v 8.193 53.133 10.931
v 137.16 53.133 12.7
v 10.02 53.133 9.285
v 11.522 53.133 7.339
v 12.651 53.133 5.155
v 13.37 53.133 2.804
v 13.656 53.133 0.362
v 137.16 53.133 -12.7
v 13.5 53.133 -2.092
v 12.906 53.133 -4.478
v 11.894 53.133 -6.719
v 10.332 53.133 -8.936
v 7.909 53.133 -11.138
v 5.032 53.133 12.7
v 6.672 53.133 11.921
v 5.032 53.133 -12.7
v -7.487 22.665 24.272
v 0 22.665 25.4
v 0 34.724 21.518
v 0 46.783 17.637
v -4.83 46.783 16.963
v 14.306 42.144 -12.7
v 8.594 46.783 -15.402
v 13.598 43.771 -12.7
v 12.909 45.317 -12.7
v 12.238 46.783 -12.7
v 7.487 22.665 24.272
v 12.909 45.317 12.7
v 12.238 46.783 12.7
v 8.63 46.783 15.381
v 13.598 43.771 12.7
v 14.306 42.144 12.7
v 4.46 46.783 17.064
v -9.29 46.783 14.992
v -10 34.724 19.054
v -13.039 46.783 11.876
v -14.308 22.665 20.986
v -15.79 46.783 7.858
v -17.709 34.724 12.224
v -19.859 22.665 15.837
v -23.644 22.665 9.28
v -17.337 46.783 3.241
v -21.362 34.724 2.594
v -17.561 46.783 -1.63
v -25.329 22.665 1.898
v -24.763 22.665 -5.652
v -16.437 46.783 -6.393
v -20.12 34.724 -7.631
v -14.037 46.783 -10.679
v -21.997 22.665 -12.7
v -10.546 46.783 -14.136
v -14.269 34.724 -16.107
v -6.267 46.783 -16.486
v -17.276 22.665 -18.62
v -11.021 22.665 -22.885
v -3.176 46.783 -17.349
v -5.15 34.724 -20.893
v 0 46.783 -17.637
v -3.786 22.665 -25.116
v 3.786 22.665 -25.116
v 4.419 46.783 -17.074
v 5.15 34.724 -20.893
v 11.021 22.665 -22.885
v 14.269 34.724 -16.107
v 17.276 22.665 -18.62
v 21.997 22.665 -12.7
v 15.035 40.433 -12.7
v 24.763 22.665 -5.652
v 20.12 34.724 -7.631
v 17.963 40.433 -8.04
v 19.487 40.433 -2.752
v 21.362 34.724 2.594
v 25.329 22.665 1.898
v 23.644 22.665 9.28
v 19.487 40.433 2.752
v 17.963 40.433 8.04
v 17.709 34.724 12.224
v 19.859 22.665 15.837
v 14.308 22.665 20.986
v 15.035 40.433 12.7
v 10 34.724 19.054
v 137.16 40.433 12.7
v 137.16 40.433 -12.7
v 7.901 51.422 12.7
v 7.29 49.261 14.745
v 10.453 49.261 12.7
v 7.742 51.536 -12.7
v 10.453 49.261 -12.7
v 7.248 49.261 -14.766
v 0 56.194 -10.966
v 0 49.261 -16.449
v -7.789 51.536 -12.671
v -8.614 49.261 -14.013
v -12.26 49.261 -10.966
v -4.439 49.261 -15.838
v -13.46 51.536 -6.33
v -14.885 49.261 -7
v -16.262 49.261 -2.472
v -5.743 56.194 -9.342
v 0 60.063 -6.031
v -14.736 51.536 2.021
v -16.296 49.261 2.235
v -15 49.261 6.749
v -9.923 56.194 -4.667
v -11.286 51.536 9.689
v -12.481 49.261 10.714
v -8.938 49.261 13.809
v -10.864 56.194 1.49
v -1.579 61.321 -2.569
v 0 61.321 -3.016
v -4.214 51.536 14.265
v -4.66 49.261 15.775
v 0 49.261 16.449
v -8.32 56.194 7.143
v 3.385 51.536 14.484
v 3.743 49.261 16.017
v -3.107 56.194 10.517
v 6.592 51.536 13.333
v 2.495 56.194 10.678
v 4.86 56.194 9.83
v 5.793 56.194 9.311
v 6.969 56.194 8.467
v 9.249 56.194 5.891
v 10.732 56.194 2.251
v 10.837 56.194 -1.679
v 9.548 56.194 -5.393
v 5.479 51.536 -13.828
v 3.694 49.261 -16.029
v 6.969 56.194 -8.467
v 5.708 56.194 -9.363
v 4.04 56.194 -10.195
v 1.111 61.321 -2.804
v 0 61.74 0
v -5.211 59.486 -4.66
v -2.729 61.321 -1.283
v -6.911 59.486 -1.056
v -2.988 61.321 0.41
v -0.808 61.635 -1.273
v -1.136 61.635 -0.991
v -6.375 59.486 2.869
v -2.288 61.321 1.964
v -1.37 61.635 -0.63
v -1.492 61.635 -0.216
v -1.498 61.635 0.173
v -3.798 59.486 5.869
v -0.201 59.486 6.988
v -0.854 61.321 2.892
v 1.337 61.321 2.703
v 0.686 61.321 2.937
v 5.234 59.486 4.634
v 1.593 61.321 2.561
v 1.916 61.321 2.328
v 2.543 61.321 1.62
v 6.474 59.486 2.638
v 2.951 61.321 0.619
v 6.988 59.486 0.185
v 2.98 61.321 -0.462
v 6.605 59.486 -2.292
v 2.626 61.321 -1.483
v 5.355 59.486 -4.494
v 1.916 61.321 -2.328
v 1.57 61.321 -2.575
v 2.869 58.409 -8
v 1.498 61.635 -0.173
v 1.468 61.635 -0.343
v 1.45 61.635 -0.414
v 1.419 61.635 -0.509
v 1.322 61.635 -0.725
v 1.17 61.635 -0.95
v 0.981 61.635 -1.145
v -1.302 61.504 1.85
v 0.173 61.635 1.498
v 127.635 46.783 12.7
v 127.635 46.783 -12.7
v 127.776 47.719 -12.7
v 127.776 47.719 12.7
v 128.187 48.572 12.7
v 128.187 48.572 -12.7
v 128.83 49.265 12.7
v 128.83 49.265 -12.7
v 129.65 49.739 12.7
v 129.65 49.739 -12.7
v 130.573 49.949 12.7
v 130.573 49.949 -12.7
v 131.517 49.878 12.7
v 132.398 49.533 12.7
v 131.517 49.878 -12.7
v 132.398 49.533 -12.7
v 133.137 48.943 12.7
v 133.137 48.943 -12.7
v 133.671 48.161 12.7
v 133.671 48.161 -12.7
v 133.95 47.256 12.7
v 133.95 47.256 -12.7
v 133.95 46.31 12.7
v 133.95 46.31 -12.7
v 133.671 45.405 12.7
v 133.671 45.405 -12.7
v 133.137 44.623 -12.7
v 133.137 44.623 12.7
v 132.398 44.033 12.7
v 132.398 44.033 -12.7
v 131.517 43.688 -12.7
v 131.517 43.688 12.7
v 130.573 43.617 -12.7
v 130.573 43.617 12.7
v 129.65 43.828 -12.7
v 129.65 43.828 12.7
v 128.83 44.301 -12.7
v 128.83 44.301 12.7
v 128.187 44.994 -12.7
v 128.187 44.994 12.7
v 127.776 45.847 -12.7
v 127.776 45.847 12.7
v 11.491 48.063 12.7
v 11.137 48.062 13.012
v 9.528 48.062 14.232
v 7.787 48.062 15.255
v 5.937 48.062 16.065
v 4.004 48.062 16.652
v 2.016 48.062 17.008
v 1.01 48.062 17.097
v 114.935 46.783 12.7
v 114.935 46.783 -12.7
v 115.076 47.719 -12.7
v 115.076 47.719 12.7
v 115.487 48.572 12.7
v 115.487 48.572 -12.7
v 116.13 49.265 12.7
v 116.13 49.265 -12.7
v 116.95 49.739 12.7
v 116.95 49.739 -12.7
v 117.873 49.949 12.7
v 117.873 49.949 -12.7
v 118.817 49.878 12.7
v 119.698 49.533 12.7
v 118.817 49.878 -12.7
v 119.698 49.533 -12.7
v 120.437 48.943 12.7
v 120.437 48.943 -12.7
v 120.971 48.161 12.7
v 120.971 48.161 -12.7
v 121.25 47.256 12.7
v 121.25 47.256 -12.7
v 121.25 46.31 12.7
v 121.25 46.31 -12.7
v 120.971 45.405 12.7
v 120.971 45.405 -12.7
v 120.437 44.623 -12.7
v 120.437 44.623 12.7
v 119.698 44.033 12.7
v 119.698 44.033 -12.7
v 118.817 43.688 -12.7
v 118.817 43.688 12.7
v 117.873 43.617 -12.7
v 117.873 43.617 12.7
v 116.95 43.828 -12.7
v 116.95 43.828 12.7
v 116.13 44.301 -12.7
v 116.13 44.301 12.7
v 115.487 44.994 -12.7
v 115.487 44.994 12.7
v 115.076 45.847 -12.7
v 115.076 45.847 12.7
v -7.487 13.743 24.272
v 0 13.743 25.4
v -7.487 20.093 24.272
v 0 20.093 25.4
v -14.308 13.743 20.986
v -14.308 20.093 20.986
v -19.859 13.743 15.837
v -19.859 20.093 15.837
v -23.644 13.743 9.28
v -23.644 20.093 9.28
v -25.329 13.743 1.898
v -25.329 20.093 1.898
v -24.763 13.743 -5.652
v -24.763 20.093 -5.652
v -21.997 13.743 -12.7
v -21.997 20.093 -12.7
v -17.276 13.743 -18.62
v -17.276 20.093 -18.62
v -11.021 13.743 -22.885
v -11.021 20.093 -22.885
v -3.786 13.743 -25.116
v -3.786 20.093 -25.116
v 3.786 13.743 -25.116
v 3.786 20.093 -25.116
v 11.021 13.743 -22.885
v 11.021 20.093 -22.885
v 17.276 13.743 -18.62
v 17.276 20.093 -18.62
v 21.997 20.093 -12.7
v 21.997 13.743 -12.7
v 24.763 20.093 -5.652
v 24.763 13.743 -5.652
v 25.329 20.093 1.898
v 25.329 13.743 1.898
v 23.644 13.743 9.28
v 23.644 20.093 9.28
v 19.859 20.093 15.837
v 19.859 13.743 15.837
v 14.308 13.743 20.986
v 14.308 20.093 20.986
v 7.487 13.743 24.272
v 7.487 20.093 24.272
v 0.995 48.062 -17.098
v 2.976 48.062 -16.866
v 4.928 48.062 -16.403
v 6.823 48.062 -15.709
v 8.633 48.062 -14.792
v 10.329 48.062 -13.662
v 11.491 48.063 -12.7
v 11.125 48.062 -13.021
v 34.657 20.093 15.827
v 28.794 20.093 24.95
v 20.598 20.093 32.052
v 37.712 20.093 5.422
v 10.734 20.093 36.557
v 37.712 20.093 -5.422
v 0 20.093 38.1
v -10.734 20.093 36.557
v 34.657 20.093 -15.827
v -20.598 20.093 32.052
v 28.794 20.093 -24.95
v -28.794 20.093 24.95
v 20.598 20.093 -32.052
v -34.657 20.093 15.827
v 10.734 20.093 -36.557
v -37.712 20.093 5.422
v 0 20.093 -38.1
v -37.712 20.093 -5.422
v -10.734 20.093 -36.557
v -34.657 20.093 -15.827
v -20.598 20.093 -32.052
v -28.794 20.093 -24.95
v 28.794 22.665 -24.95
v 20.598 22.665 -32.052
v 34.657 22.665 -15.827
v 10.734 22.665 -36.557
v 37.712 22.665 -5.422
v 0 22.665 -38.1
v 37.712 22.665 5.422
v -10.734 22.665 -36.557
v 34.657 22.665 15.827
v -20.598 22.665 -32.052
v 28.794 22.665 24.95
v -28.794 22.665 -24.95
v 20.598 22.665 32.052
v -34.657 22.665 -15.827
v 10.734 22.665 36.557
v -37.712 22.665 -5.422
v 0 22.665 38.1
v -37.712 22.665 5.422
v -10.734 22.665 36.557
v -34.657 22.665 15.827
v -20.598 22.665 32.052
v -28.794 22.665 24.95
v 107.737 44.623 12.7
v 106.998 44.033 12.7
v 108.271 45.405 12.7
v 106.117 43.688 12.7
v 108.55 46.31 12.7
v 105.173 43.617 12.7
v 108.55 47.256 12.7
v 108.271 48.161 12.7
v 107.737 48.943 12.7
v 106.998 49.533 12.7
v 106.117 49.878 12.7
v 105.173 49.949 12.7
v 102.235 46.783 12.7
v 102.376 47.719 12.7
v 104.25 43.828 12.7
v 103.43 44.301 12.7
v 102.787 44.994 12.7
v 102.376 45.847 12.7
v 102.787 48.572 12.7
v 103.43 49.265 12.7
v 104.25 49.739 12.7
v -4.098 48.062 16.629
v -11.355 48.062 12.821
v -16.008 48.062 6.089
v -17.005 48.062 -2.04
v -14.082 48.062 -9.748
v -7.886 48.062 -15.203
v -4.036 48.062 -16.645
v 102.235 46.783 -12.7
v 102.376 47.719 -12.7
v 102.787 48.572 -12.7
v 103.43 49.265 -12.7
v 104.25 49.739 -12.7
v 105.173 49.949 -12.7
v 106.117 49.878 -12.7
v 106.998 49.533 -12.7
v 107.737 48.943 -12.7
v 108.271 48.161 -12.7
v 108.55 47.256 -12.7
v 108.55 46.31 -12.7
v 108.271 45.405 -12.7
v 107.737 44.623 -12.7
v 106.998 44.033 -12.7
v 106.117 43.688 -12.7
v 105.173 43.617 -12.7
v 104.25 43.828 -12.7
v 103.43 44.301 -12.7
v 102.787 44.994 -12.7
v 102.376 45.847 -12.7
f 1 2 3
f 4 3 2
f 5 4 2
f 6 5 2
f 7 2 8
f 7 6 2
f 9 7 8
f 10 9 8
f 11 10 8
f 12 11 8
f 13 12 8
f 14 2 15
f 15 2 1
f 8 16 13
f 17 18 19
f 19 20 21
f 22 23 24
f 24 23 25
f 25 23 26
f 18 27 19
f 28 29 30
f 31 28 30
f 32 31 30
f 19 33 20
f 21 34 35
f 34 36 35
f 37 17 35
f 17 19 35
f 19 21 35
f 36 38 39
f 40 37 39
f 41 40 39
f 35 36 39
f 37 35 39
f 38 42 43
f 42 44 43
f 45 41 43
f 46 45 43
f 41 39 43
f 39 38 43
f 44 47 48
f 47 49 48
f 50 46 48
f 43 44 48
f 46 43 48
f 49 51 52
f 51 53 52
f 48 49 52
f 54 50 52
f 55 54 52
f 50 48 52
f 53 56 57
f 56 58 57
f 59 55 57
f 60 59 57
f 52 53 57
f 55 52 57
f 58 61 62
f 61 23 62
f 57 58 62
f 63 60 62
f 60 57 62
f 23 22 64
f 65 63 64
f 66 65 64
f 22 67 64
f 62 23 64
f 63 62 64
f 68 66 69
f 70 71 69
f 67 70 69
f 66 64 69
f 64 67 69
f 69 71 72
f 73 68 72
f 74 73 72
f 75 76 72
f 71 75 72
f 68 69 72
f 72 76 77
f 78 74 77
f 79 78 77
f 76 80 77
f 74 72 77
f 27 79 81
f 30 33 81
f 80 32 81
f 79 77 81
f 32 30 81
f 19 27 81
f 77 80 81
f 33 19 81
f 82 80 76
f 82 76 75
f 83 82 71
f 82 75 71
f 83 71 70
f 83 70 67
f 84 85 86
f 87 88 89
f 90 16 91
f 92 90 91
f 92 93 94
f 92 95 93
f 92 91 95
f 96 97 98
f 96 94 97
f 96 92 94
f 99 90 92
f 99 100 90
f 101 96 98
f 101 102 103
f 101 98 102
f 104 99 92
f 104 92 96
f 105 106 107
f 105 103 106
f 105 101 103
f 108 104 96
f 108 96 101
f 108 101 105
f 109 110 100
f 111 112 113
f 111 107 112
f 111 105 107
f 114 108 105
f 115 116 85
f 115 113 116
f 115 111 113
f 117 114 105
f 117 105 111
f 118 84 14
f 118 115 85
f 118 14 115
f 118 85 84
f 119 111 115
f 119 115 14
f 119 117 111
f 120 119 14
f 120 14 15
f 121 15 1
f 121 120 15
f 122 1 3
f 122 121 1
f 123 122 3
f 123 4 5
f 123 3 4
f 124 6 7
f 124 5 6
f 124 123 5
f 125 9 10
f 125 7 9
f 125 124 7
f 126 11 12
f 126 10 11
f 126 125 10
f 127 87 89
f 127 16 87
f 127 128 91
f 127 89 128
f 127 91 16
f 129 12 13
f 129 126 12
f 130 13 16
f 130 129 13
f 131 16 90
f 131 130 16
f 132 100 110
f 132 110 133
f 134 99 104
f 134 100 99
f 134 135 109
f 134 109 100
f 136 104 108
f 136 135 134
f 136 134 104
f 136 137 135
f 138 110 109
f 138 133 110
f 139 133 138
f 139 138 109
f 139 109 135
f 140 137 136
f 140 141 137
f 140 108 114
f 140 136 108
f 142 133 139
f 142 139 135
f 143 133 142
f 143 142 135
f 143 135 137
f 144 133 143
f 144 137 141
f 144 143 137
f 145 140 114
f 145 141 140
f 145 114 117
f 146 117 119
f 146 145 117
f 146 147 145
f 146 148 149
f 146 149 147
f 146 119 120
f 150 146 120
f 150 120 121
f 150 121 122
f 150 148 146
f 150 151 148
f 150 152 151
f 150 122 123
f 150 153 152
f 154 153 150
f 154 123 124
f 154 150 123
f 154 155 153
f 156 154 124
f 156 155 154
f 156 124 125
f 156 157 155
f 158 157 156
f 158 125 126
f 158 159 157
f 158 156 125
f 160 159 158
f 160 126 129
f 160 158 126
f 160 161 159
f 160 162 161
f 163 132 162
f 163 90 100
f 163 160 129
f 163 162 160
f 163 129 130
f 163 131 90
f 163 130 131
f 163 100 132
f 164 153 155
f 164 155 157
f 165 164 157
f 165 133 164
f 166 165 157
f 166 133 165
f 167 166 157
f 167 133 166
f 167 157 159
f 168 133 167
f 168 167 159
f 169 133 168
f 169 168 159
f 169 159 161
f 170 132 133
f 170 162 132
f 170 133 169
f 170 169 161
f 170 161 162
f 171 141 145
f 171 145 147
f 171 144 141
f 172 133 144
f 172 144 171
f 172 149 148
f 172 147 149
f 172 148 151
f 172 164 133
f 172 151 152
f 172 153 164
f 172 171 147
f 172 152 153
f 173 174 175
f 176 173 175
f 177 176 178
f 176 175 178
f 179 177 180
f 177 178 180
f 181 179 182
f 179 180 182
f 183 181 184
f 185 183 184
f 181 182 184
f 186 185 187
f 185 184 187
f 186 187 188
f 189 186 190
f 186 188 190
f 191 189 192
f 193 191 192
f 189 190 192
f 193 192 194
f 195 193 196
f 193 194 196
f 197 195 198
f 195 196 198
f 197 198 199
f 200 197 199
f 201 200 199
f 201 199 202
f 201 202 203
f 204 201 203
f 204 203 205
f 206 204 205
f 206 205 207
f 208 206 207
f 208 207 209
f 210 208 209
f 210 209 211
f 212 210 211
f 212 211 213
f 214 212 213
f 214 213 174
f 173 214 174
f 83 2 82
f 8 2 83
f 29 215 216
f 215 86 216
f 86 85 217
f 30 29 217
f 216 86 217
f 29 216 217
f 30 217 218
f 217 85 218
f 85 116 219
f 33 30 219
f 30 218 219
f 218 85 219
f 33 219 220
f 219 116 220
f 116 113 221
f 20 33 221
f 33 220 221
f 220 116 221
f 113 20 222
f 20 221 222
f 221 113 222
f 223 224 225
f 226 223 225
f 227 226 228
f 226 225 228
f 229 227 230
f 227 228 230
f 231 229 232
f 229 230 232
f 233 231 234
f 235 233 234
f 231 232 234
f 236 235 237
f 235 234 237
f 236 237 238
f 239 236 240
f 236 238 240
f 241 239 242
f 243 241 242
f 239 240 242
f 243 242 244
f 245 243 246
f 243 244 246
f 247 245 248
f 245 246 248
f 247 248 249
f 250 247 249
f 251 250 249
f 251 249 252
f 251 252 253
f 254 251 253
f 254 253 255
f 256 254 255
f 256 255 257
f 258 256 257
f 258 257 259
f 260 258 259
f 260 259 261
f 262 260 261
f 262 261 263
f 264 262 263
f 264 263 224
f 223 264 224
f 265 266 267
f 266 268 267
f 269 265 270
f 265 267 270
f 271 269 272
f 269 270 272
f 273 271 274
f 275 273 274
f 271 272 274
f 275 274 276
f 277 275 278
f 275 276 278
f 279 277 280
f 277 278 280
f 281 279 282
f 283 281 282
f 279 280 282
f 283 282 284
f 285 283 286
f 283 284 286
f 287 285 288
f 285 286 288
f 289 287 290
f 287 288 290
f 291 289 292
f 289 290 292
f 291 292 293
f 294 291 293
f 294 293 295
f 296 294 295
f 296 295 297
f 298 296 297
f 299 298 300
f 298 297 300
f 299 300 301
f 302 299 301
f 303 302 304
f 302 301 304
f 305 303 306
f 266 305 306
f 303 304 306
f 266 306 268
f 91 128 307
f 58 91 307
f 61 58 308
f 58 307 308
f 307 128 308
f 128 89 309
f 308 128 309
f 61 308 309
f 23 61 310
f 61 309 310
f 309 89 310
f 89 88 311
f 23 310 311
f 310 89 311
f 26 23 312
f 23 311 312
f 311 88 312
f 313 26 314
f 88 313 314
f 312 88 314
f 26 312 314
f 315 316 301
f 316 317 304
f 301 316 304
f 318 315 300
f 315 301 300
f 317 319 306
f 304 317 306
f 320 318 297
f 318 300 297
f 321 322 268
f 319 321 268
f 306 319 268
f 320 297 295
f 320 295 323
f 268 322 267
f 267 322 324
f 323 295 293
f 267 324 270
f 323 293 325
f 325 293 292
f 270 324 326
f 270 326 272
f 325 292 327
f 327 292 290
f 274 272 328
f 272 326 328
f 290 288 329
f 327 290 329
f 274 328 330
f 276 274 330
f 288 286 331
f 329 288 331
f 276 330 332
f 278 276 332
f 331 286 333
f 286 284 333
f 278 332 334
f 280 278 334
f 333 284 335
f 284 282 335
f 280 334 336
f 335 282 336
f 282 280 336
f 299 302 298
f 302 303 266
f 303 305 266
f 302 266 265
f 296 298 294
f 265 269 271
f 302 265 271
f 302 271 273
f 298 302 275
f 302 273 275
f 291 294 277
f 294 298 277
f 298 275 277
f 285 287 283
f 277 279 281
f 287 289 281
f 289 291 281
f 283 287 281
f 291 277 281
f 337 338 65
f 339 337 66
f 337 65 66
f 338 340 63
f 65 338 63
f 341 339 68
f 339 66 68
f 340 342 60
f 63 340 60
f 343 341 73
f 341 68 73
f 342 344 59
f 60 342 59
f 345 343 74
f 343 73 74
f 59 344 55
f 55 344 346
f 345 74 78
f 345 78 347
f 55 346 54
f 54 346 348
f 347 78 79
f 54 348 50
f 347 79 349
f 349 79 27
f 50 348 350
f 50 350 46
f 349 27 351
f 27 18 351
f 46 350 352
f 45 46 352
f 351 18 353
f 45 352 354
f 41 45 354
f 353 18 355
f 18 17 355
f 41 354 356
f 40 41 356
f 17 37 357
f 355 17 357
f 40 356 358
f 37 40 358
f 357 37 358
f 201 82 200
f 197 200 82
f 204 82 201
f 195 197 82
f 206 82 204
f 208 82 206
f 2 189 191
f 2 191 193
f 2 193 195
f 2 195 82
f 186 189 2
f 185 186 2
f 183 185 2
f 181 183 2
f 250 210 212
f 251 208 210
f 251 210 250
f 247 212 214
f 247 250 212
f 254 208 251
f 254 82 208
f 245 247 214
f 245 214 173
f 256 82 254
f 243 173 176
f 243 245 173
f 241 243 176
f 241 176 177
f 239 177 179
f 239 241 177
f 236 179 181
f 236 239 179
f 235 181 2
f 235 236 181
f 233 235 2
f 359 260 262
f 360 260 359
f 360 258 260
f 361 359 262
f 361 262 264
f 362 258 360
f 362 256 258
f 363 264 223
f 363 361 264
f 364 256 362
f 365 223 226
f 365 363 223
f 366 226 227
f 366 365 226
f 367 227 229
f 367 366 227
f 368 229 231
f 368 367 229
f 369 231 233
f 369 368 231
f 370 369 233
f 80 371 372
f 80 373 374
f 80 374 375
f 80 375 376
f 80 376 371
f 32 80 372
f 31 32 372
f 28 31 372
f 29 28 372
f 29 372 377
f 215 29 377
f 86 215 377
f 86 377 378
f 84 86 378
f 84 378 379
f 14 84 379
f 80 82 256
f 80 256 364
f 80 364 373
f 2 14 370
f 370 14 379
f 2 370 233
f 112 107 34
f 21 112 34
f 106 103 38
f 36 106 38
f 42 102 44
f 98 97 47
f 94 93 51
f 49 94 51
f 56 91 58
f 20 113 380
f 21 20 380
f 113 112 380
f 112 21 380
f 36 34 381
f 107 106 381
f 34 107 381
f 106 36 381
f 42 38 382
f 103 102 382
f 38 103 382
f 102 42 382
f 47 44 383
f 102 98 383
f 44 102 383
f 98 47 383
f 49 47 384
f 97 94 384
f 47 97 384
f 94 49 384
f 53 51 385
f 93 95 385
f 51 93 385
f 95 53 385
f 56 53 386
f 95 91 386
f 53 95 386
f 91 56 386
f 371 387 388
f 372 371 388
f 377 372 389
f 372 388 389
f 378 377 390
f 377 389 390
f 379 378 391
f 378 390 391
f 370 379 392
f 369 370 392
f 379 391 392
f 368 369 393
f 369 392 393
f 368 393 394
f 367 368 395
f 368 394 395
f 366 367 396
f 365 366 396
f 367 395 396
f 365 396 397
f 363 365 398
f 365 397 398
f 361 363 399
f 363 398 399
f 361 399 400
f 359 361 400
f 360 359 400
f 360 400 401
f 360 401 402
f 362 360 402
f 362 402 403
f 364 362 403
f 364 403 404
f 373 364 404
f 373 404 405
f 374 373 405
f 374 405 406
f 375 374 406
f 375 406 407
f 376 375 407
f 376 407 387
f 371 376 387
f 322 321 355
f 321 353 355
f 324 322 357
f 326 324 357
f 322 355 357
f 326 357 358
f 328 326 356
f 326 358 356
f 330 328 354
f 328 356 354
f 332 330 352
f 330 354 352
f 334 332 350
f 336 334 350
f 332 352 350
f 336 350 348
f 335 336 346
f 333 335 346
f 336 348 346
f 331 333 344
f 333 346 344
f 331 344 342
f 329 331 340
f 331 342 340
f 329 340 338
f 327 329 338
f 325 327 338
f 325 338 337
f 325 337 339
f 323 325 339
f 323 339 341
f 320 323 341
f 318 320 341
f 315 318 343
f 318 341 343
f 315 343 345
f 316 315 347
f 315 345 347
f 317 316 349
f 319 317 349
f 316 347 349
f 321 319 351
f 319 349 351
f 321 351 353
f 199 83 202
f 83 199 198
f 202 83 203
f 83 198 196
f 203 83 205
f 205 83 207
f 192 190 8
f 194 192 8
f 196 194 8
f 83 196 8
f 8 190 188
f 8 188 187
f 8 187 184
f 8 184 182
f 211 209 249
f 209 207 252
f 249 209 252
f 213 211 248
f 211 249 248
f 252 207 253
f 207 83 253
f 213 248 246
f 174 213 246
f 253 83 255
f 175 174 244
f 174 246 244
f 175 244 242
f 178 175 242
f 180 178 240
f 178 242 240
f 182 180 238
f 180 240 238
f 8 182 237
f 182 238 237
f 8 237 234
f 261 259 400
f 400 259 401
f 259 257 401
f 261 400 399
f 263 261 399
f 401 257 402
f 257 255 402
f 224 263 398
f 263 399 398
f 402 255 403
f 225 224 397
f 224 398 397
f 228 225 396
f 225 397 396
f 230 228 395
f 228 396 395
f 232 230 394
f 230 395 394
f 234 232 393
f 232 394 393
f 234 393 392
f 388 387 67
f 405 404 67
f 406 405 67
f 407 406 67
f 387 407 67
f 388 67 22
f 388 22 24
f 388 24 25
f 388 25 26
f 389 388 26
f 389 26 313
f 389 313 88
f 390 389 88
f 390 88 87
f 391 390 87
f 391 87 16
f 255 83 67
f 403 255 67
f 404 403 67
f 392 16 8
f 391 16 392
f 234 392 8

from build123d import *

# Parameters (mm, degrees)
SKETCH1_W                = 25.4
SKETCH1_H                = 6.35
FILLET1_R                = 10.16
BOSS_EXTRUDE1_DEPTH      = 38.1
BOSS_EXTRUDE1_DEPTH_BACK = 20.32
SKETCH3_W                = 25.4
SKETCH3_H                = 12.7
SKETCH4_W                = 25.4
SKETCH4_H                = 12.7
BOSS_EXTRUDE2_DEPTH      = 76.2
SKETCH5_R                = 3.175
CUT_EXTRUDE1_DEPTH       = 159.762008669


with BuildPart() as part:
    # Sketch1 → Revolve1 (revolve)
    with BuildSketch(Plane.XY, mode=Mode.PRIVATE) as revolve1_sk:
        Polygon((0, 48.048104246), (0, 22.664551268), (25.4, 22.664551268), (17.22966458, 48.048104246), align=None)
        Polygon((0, 22.664551268), (0, 20.09296726), (25.4, 20.09296726), (38.1, 20.09296726), (38.1, 22.664551268), (25.4, 22.664551268), align=None)
        with Locations((12.7, 16.91796726)):
            Rectangle(SKETCH1_W, SKETCH1_H)
    revolve(revolve1_sk.sketch.rotate(Axis((0, 27.702147105, 0), (0, -1, 0)), 90), axis=Axis((0, 27.702147105, 0), (0, -1, 0)))

    # Sketch2 → Revolve2 (revolve)
    with BuildSketch(Plane(origin=(0, 0, 0), x_dir=(0, 0, -1), z_dir=(1, 0, 0))):
        with BuildLine():
            Line((0, 48.048104246), (17.22966458, 48.048104246))
            add(Edge.make_bspline(
                [(17.22966458, 48.048104246), (8.61483229, 61.740341407), (0, 61.740341407)],
                knots=[0, 0, 0, 0.5, 0.5, 0.5], degree=2))
            Line((0, 61.740341407), (0, 48.048104246))
        make_face()
    revolve(axis=Axis((0, 0, 0), (0, 1, 0)))

    # Fillet1
    fillet1_edges = [part.edges().sort_by_distance(p)[0] for p in [
        (-17.22966458, 48.048104246, 0),
    ]]
    fillet(fillet1_edges, radius=FILLET1_R)

    # Sketch3 → Boss-Extrude1 (add, two sides: drawn at the far end of the back side and taken through both)
    with BuildSketch(Plane(origin=(22.86, 0, 0), x_dir=(0, 0, -1), z_dir=(1, 0, 0)).offset(-BOSS_EXTRUDE1_DEPTH_BACK)):
        with Locations((0, 46.783028789)):
            Rectangle(SKETCH3_W, SKETCH3_H)
    extrude(amount=BOSS_EXTRUDE1_DEPTH + BOSS_EXTRUDE1_DEPTH_BACK)

    # Sketch4 → Boss-Extrude2 (add)
    with BuildSketch(Plane(origin=(60.96, 0, 0), x_dir=(0, 0, -1), z_dir=(1, 0, 0))):
        with Locations((0, 46.783028789)):
            Rectangle(SKETCH4_W, SKETCH4_H)
    extrude(amount=BOSS_EXTRUDE2_DEPTH)

    # Sketch5 → Cut-Extrude1 (cut, through all)
    with BuildSketch(Plane(origin=(0, 0, -12.7), x_dir=(-1, 0, 0), z_dir=(0, 0, -1))):
        with Locations((-130.81, 46.783028789)):
            Circle(SKETCH5_R)
        with Locations((-118.11, 46.783028789)):
            Circle(SKETCH5_R)
        with Locations((-105.41, 46.783028789)):
            Circle(SKETCH5_R)
    extrude(amount=-CUT_EXTRUDE1_DEPTH, mode=Mode.SUBTRACT)


solid = part.part
